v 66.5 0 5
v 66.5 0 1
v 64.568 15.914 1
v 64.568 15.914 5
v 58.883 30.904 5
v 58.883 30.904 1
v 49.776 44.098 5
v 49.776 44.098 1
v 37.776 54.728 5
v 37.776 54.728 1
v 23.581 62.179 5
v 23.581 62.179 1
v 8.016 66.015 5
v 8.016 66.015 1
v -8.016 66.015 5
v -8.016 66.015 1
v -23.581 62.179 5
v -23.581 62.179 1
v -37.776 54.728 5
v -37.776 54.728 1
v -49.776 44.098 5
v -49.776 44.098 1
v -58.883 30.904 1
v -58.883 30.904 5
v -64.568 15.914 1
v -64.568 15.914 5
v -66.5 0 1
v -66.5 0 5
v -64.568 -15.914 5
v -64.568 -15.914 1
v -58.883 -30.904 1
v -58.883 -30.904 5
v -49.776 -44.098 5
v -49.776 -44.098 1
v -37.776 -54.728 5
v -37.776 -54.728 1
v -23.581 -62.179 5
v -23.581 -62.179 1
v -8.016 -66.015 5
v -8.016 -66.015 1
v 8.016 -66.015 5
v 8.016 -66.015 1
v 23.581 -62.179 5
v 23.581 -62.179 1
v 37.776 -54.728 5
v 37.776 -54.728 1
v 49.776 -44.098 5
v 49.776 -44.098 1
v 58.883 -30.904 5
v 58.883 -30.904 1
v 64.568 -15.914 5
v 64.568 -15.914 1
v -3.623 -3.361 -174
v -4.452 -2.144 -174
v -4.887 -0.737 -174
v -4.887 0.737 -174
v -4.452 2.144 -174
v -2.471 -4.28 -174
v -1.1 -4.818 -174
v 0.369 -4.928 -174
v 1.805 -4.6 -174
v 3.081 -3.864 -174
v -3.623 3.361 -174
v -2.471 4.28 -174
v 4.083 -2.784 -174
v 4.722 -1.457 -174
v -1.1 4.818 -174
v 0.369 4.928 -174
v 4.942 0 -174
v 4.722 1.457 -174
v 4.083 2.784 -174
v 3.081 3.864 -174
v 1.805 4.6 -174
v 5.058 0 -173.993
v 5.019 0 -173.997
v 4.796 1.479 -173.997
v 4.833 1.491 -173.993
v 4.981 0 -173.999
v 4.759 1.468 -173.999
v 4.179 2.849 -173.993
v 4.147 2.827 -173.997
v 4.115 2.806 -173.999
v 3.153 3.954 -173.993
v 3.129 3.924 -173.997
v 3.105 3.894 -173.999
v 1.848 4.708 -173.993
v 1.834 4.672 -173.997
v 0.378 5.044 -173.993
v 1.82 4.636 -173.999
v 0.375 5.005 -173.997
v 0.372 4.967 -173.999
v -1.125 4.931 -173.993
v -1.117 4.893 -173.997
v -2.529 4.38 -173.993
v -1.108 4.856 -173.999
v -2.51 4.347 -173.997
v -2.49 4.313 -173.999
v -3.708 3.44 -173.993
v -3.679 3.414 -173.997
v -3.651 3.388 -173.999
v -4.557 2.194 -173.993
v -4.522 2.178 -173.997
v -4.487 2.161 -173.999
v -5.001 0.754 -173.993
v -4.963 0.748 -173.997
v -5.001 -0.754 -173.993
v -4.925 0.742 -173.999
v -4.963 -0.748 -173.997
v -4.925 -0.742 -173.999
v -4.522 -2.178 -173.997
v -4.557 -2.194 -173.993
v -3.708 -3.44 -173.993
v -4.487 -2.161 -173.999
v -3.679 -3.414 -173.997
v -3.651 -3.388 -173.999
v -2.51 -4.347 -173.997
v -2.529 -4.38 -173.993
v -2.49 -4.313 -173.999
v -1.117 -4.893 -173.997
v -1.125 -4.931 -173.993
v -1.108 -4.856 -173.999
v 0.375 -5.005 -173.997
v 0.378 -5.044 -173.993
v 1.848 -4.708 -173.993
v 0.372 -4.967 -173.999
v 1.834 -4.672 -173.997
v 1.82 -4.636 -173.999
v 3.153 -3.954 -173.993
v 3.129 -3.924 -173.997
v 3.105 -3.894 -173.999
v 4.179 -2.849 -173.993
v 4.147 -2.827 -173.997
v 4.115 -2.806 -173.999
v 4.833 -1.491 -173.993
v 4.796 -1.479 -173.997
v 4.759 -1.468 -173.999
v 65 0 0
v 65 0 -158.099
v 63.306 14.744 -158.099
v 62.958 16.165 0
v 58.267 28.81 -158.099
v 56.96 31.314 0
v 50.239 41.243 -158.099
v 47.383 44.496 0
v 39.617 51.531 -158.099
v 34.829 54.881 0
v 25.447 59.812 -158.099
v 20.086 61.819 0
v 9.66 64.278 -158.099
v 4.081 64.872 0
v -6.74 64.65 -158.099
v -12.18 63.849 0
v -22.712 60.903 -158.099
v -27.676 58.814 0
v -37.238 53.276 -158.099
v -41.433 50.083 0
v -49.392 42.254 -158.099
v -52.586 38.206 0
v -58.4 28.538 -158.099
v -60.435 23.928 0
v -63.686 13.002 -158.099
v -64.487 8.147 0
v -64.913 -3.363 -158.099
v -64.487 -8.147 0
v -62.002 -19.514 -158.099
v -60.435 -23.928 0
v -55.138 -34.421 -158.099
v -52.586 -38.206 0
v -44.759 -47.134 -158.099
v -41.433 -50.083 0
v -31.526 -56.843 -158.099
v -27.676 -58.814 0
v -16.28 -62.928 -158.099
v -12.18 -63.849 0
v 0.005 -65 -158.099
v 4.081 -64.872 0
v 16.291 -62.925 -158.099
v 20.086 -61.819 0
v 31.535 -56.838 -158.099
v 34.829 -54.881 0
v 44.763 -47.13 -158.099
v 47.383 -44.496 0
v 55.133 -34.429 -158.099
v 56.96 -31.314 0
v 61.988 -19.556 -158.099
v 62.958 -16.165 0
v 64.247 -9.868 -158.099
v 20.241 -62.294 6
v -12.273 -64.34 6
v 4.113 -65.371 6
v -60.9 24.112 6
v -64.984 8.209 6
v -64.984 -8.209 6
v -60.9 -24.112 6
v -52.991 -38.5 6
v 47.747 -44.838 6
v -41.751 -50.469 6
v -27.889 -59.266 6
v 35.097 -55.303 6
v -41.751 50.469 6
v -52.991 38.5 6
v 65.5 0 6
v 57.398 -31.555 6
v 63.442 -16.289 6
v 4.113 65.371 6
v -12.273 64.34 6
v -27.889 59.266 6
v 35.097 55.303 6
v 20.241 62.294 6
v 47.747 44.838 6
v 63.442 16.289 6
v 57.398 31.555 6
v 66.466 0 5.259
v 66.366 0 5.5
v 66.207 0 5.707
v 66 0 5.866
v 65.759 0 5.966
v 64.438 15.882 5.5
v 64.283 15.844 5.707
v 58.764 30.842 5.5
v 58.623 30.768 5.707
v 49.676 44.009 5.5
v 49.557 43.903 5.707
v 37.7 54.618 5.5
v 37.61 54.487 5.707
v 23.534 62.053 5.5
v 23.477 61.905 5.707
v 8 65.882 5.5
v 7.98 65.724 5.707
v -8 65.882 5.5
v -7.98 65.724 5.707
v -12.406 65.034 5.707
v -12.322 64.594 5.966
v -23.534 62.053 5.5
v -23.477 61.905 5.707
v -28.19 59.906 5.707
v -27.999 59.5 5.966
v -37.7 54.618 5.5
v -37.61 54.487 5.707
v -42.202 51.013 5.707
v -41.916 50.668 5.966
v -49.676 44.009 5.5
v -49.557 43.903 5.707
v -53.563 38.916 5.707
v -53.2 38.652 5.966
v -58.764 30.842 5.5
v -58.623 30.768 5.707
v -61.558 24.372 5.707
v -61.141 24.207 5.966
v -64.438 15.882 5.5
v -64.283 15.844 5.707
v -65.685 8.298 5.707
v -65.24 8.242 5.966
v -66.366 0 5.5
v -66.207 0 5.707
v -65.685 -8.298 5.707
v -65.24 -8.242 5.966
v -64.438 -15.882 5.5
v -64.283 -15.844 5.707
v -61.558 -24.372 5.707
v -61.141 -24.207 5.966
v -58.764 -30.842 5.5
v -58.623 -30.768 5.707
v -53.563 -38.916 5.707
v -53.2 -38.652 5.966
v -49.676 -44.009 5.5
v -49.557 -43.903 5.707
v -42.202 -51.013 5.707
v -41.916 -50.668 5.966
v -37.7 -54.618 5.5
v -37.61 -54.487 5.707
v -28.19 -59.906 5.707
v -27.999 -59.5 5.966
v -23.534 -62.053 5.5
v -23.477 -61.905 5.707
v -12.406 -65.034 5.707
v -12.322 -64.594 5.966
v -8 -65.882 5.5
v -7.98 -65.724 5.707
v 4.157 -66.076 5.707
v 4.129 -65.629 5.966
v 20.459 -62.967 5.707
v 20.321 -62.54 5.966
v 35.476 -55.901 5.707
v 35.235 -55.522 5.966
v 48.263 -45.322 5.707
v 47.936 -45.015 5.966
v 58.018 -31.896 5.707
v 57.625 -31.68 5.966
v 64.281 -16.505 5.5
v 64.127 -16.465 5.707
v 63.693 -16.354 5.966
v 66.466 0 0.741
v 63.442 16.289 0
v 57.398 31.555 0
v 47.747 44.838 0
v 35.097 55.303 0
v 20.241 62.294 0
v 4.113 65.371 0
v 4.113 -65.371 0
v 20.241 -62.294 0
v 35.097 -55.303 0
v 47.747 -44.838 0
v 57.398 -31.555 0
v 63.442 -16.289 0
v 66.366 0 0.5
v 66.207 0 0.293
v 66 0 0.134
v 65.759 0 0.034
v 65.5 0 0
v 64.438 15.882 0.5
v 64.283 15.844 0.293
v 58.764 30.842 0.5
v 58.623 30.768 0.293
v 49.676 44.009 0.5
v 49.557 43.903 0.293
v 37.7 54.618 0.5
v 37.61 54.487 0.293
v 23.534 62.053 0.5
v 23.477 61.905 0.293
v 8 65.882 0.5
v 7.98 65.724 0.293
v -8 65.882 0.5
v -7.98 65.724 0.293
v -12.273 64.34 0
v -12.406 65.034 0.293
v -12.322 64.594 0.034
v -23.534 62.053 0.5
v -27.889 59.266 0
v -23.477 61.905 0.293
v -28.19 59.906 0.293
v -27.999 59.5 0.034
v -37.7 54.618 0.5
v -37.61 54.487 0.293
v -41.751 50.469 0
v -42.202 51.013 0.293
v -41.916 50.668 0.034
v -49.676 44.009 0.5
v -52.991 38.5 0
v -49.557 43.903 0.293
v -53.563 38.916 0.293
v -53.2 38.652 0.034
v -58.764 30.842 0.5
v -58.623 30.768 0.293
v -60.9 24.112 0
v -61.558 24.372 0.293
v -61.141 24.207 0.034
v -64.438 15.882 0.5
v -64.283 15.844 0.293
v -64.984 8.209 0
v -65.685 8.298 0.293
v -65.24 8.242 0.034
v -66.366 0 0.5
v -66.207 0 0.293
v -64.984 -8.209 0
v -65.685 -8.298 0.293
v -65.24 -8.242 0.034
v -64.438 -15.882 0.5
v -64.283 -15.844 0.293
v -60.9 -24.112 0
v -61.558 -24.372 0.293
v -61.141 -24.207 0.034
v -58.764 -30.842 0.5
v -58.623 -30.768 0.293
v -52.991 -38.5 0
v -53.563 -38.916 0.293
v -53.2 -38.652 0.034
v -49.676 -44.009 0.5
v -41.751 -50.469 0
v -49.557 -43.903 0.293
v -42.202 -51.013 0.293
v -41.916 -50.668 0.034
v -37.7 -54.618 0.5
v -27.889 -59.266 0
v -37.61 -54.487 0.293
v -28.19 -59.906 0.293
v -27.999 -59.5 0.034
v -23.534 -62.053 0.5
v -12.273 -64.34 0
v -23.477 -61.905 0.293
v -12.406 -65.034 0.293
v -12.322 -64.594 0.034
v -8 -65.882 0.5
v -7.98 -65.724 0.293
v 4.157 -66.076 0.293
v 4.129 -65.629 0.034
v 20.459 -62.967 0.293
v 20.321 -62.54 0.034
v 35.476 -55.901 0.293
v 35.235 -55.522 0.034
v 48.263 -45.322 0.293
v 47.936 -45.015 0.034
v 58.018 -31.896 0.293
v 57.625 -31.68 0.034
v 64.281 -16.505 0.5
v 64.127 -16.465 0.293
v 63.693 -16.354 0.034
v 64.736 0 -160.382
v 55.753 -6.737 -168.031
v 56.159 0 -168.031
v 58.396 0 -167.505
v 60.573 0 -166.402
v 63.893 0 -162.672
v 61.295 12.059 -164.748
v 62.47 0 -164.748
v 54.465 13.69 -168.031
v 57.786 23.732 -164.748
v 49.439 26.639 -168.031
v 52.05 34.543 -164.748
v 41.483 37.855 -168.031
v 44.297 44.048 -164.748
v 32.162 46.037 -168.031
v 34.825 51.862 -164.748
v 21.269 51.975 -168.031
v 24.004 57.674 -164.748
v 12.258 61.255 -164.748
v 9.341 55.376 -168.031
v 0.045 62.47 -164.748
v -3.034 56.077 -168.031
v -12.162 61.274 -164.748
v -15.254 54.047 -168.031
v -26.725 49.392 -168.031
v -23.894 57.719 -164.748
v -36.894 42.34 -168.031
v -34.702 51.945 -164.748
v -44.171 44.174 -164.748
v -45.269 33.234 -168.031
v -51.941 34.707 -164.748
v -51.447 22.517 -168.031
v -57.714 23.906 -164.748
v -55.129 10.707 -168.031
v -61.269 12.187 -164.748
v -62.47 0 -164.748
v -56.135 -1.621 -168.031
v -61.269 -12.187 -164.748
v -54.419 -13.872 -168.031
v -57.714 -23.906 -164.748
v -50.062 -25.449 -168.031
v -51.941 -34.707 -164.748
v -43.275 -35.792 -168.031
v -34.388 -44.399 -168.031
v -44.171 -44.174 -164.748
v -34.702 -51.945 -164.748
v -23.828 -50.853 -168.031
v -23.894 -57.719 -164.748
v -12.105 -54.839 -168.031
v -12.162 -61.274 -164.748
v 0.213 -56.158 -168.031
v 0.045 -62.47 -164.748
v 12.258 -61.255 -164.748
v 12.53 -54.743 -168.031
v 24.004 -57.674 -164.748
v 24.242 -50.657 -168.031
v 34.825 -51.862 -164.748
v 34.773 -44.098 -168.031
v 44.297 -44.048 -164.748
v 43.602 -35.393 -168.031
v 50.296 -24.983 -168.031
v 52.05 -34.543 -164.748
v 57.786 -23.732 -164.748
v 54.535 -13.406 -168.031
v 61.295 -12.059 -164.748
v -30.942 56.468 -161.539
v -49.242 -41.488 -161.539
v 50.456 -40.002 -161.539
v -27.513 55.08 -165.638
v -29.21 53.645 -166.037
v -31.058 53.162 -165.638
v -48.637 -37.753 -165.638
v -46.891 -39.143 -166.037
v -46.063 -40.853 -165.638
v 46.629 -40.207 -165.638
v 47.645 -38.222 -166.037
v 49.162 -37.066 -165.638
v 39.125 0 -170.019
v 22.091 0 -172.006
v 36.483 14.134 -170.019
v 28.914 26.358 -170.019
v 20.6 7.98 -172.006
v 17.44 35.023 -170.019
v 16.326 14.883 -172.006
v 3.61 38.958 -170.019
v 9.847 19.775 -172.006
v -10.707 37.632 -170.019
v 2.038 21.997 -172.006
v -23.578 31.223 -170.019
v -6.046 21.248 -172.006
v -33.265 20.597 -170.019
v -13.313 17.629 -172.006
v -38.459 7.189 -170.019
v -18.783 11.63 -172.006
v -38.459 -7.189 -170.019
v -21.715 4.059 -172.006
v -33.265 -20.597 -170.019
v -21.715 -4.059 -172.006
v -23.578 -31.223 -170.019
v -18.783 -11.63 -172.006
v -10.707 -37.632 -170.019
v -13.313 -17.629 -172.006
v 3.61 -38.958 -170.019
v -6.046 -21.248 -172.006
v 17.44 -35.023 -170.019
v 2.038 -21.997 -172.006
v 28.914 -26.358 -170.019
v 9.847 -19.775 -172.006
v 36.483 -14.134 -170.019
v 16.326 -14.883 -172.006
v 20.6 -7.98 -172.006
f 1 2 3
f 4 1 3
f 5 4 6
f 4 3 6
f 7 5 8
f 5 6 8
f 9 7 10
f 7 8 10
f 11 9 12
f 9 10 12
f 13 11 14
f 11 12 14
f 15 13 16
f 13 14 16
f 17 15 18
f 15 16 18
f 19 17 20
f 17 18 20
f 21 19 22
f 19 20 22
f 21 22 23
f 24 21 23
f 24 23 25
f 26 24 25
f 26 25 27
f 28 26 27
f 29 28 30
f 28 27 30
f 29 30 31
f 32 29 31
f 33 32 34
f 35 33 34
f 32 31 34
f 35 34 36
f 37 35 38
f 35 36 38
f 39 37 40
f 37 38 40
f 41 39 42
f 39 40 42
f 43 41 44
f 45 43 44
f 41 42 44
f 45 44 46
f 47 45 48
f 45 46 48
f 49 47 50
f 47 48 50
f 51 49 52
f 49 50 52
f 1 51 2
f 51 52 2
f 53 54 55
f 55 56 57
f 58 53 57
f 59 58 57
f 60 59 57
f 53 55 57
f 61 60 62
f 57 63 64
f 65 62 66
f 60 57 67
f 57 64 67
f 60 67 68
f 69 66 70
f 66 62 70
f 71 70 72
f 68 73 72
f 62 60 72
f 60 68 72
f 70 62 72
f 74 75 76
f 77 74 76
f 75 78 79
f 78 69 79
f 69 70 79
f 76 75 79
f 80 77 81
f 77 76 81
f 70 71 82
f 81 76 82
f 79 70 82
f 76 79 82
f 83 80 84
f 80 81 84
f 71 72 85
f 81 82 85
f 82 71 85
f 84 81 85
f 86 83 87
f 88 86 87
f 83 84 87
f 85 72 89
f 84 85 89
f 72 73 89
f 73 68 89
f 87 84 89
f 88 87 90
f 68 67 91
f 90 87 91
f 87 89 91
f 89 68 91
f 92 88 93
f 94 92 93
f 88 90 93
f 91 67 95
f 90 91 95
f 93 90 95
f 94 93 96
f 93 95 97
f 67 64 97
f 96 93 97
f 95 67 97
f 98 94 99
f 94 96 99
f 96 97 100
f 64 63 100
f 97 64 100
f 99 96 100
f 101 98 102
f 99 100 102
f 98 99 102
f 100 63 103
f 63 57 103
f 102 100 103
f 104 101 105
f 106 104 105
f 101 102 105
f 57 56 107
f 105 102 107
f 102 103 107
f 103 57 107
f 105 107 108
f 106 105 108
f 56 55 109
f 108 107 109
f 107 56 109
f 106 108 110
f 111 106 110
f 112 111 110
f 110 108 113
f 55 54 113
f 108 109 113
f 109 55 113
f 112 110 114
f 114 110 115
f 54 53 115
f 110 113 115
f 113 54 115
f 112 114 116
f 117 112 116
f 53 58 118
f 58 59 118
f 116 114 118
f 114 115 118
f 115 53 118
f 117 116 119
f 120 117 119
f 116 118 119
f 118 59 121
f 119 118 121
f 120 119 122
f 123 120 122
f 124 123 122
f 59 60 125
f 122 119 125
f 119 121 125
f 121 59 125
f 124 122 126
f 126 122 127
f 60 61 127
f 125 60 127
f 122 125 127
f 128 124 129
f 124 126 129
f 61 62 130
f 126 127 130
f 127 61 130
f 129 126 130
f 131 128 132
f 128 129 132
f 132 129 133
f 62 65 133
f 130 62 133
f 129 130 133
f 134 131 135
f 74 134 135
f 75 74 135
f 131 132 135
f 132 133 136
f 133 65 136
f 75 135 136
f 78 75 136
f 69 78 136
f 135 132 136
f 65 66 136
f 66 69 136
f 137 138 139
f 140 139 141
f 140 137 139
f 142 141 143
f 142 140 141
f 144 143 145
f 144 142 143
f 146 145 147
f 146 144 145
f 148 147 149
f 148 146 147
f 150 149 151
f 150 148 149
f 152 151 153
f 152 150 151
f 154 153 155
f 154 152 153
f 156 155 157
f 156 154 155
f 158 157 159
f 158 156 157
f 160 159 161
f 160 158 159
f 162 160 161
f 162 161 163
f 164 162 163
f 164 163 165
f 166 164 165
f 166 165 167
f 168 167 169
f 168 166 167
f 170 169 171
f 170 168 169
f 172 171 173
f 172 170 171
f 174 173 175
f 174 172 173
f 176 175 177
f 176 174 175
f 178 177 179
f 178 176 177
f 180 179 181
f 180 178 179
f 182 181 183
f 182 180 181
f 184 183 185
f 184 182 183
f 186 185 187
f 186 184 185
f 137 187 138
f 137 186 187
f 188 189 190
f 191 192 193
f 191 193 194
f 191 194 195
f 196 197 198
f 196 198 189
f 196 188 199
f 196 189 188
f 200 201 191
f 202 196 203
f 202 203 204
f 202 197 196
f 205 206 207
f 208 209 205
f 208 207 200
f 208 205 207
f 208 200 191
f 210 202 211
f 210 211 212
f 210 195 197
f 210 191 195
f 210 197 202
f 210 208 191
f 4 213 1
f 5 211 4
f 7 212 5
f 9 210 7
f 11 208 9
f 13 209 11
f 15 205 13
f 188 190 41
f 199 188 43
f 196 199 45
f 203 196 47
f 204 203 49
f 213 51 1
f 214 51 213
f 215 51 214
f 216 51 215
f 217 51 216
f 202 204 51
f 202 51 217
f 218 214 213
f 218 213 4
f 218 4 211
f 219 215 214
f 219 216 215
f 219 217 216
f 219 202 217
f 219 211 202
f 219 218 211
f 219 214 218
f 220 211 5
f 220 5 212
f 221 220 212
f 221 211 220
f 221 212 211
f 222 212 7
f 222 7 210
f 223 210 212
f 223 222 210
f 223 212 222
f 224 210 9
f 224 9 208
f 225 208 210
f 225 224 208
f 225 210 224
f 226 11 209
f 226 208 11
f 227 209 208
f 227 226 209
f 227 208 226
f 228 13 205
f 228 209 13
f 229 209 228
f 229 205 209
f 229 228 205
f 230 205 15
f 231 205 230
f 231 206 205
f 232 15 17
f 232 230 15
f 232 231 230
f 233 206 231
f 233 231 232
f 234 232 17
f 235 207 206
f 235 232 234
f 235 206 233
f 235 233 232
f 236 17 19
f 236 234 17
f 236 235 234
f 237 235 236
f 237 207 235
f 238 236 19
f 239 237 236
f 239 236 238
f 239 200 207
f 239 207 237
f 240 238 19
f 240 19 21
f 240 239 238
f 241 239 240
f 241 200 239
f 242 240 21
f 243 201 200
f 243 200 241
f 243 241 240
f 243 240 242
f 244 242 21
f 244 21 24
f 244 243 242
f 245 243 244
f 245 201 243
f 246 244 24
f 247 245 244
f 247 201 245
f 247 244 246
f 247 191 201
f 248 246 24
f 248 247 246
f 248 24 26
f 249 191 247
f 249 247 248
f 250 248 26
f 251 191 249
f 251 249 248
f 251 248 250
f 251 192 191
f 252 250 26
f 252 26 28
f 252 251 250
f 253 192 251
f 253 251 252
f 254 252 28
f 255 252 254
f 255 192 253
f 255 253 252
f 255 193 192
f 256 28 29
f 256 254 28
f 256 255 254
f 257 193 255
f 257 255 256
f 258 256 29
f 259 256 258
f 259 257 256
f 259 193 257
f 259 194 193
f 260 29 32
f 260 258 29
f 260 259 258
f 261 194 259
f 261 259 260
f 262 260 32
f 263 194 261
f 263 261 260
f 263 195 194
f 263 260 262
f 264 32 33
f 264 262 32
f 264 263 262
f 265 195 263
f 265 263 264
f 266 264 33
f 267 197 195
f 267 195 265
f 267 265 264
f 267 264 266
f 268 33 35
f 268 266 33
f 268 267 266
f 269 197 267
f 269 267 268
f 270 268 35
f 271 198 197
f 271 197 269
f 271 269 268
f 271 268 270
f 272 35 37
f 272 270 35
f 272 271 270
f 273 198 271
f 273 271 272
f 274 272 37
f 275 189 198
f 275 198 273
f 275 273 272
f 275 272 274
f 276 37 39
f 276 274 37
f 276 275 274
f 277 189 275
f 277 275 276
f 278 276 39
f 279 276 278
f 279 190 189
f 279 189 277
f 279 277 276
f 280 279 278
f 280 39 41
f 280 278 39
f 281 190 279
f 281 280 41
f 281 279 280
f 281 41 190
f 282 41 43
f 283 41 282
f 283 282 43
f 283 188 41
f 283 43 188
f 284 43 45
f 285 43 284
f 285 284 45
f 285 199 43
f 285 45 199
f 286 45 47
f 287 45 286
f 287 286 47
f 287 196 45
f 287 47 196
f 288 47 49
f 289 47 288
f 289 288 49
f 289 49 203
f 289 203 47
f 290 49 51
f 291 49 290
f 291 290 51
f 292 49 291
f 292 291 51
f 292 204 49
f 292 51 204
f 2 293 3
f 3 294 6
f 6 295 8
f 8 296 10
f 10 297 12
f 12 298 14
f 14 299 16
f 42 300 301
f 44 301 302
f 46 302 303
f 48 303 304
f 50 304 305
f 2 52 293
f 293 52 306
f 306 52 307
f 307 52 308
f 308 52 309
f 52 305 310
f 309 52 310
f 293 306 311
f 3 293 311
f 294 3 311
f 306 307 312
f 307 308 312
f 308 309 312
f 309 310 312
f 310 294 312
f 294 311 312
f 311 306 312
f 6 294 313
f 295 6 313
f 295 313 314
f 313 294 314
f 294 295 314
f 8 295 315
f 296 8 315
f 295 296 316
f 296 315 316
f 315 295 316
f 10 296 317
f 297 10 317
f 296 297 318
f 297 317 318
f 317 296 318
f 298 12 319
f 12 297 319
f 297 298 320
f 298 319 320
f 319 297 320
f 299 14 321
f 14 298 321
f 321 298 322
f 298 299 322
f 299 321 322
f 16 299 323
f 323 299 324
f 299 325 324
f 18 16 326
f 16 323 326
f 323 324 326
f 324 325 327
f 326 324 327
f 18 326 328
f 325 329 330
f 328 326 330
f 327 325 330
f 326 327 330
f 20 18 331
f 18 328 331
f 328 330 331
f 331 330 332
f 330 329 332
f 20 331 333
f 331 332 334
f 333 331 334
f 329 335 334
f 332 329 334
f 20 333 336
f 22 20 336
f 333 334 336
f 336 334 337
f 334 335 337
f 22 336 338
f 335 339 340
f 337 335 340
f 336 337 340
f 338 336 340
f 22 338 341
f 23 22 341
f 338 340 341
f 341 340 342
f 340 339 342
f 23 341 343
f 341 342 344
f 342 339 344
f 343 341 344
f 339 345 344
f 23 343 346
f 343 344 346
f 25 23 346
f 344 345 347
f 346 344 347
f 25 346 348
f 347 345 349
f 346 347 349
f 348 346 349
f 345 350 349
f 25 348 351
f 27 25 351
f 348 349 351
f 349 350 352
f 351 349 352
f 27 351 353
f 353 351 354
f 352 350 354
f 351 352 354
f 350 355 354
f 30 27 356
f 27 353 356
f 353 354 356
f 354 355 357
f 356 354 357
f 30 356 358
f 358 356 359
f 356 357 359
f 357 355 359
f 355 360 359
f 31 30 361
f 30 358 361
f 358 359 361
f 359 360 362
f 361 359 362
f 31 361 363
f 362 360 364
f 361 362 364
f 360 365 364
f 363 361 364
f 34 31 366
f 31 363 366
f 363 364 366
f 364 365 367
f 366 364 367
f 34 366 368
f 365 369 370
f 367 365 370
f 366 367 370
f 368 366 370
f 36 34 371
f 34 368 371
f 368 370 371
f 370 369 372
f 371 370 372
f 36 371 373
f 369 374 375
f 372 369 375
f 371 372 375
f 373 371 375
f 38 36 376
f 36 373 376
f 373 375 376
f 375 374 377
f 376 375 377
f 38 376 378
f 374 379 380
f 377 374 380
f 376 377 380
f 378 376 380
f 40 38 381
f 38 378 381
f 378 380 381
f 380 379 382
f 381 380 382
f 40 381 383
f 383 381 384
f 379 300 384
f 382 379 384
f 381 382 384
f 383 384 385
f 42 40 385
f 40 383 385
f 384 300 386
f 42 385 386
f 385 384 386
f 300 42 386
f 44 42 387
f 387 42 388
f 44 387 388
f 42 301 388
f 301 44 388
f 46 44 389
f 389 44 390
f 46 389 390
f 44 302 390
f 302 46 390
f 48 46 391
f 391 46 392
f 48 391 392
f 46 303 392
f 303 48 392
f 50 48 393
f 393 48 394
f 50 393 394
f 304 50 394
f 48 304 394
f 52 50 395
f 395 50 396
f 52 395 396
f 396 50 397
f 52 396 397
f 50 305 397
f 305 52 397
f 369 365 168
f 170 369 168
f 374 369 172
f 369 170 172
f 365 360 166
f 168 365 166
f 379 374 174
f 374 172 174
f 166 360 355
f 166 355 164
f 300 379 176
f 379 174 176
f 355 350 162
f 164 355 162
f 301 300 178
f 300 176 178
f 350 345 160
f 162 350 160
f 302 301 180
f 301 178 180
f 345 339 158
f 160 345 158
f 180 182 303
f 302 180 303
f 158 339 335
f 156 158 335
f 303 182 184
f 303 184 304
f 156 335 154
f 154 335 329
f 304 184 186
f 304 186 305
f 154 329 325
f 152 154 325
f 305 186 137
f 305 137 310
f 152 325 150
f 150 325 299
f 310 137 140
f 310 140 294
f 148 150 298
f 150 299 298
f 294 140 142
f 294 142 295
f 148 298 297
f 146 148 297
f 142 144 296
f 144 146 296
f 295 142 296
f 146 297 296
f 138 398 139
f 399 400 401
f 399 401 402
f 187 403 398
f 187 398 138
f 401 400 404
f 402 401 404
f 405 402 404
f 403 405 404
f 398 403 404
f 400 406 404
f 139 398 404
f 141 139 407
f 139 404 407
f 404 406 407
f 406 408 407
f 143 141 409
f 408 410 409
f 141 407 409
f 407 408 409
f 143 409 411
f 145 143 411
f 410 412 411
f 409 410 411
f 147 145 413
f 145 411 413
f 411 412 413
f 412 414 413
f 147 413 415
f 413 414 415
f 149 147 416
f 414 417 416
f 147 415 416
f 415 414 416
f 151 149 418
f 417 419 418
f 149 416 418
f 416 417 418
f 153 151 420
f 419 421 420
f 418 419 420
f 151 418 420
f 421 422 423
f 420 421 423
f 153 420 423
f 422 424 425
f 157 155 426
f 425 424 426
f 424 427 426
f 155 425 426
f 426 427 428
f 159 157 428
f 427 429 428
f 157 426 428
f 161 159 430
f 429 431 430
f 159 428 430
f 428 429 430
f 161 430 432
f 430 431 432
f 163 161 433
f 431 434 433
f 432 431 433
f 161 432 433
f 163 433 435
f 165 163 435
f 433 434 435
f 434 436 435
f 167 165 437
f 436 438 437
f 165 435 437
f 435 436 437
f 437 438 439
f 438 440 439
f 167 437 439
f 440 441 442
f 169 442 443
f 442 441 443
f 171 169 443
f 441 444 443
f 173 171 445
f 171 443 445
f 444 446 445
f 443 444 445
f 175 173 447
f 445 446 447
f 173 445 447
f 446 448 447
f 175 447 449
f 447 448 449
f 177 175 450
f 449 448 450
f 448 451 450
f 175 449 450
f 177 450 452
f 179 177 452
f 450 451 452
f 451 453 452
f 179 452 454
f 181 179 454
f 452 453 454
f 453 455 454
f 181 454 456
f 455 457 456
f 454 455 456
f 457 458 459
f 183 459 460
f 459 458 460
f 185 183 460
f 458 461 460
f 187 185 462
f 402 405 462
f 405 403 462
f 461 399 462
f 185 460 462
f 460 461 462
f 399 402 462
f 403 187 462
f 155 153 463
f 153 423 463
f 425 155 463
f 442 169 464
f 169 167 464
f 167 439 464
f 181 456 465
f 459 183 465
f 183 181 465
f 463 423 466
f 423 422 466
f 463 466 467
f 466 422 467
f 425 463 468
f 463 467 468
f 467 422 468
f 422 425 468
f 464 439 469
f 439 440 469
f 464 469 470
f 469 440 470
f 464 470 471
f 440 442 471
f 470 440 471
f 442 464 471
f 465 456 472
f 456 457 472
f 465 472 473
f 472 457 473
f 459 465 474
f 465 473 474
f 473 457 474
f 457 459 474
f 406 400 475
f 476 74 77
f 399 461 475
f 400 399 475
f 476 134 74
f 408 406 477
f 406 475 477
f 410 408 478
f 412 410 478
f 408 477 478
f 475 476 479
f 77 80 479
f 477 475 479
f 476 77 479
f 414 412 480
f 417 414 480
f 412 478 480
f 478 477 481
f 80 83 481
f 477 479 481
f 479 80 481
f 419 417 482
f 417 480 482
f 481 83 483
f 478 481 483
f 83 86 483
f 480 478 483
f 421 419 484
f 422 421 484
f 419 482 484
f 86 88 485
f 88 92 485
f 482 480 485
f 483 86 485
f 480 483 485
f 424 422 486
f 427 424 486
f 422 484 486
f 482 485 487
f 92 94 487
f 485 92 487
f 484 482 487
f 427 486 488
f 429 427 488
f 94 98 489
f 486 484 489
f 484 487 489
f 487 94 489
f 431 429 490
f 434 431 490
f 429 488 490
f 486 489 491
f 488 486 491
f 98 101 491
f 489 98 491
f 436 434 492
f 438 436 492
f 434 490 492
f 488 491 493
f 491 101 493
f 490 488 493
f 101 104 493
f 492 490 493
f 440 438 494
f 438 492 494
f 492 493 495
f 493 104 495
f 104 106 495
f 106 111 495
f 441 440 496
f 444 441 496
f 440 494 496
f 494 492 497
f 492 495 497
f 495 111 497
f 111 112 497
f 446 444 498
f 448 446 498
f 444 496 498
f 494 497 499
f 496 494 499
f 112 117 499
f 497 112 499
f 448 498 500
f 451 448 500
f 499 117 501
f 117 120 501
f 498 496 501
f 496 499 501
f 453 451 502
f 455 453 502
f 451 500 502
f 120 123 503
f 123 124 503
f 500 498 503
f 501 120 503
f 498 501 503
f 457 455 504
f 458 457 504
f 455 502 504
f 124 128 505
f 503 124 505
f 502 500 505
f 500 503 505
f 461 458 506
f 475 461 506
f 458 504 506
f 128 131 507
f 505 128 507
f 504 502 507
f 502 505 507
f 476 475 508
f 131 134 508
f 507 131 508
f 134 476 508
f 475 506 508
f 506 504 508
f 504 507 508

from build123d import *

# Parameters (mm, degrees)
F0_R     = 65
F1_DEPTH = 174
F2_SIZE2 = 60
F2_SIZE  = 7
F3_R     = 1
F4_R     = 10
F5_R     = 66.5
F5_R_2   = 65
F6_DEPTH = 6
F7_R     = 1


with BuildPart() as f1:
    # F0 (on Top) → F1 (new body)
    with BuildSketch(Plane.XY):
        Circle(F0_R)
    extrude(amount=-F1_DEPTH)

    # F2
    f2_edges = [f1.edges().sort_by_distance(p)[0] for p in [
        (-65, 0, -174),
    ]]
    f2_side = f1.faces().sort_by_distance((-65, 0, -87))[0]
    chamfer(f2_edges, length=F2_SIZE, length2=F2_SIZE2, reference=f2_side)

    # F3
    f3_edges = [f1.edges().sort_by_distance(p)[0] for p in [
        (-5, 0, -174),
    ]]
    fillet(f3_edges, radius=F3_R)

    # F4
    f4_edges = [f1.edges().sort_by_distance(p)[0] for p in [
        (-65, 0, -167),
    ]]
    fillet(f4_edges, radius=F4_R)

    # F5 (on face) → F6 (join)
    with BuildSketch(Plane.XY):
        Circle(F5_R)
        Circle(F5_R_2, mode=Mode.SUBTRACT)
        Circle(F5_R_2)
    extrude(amount=F6_DEPTH)

    # F7
    f7_edges = [f1.edges().sort_by_distance(p)[0] for p in [
        (-66.5, 0, 6),
        (-66.5, 0, 0),
    ]]
    fillet(f7_edges, radius=F7_R)


solid = f1.part
